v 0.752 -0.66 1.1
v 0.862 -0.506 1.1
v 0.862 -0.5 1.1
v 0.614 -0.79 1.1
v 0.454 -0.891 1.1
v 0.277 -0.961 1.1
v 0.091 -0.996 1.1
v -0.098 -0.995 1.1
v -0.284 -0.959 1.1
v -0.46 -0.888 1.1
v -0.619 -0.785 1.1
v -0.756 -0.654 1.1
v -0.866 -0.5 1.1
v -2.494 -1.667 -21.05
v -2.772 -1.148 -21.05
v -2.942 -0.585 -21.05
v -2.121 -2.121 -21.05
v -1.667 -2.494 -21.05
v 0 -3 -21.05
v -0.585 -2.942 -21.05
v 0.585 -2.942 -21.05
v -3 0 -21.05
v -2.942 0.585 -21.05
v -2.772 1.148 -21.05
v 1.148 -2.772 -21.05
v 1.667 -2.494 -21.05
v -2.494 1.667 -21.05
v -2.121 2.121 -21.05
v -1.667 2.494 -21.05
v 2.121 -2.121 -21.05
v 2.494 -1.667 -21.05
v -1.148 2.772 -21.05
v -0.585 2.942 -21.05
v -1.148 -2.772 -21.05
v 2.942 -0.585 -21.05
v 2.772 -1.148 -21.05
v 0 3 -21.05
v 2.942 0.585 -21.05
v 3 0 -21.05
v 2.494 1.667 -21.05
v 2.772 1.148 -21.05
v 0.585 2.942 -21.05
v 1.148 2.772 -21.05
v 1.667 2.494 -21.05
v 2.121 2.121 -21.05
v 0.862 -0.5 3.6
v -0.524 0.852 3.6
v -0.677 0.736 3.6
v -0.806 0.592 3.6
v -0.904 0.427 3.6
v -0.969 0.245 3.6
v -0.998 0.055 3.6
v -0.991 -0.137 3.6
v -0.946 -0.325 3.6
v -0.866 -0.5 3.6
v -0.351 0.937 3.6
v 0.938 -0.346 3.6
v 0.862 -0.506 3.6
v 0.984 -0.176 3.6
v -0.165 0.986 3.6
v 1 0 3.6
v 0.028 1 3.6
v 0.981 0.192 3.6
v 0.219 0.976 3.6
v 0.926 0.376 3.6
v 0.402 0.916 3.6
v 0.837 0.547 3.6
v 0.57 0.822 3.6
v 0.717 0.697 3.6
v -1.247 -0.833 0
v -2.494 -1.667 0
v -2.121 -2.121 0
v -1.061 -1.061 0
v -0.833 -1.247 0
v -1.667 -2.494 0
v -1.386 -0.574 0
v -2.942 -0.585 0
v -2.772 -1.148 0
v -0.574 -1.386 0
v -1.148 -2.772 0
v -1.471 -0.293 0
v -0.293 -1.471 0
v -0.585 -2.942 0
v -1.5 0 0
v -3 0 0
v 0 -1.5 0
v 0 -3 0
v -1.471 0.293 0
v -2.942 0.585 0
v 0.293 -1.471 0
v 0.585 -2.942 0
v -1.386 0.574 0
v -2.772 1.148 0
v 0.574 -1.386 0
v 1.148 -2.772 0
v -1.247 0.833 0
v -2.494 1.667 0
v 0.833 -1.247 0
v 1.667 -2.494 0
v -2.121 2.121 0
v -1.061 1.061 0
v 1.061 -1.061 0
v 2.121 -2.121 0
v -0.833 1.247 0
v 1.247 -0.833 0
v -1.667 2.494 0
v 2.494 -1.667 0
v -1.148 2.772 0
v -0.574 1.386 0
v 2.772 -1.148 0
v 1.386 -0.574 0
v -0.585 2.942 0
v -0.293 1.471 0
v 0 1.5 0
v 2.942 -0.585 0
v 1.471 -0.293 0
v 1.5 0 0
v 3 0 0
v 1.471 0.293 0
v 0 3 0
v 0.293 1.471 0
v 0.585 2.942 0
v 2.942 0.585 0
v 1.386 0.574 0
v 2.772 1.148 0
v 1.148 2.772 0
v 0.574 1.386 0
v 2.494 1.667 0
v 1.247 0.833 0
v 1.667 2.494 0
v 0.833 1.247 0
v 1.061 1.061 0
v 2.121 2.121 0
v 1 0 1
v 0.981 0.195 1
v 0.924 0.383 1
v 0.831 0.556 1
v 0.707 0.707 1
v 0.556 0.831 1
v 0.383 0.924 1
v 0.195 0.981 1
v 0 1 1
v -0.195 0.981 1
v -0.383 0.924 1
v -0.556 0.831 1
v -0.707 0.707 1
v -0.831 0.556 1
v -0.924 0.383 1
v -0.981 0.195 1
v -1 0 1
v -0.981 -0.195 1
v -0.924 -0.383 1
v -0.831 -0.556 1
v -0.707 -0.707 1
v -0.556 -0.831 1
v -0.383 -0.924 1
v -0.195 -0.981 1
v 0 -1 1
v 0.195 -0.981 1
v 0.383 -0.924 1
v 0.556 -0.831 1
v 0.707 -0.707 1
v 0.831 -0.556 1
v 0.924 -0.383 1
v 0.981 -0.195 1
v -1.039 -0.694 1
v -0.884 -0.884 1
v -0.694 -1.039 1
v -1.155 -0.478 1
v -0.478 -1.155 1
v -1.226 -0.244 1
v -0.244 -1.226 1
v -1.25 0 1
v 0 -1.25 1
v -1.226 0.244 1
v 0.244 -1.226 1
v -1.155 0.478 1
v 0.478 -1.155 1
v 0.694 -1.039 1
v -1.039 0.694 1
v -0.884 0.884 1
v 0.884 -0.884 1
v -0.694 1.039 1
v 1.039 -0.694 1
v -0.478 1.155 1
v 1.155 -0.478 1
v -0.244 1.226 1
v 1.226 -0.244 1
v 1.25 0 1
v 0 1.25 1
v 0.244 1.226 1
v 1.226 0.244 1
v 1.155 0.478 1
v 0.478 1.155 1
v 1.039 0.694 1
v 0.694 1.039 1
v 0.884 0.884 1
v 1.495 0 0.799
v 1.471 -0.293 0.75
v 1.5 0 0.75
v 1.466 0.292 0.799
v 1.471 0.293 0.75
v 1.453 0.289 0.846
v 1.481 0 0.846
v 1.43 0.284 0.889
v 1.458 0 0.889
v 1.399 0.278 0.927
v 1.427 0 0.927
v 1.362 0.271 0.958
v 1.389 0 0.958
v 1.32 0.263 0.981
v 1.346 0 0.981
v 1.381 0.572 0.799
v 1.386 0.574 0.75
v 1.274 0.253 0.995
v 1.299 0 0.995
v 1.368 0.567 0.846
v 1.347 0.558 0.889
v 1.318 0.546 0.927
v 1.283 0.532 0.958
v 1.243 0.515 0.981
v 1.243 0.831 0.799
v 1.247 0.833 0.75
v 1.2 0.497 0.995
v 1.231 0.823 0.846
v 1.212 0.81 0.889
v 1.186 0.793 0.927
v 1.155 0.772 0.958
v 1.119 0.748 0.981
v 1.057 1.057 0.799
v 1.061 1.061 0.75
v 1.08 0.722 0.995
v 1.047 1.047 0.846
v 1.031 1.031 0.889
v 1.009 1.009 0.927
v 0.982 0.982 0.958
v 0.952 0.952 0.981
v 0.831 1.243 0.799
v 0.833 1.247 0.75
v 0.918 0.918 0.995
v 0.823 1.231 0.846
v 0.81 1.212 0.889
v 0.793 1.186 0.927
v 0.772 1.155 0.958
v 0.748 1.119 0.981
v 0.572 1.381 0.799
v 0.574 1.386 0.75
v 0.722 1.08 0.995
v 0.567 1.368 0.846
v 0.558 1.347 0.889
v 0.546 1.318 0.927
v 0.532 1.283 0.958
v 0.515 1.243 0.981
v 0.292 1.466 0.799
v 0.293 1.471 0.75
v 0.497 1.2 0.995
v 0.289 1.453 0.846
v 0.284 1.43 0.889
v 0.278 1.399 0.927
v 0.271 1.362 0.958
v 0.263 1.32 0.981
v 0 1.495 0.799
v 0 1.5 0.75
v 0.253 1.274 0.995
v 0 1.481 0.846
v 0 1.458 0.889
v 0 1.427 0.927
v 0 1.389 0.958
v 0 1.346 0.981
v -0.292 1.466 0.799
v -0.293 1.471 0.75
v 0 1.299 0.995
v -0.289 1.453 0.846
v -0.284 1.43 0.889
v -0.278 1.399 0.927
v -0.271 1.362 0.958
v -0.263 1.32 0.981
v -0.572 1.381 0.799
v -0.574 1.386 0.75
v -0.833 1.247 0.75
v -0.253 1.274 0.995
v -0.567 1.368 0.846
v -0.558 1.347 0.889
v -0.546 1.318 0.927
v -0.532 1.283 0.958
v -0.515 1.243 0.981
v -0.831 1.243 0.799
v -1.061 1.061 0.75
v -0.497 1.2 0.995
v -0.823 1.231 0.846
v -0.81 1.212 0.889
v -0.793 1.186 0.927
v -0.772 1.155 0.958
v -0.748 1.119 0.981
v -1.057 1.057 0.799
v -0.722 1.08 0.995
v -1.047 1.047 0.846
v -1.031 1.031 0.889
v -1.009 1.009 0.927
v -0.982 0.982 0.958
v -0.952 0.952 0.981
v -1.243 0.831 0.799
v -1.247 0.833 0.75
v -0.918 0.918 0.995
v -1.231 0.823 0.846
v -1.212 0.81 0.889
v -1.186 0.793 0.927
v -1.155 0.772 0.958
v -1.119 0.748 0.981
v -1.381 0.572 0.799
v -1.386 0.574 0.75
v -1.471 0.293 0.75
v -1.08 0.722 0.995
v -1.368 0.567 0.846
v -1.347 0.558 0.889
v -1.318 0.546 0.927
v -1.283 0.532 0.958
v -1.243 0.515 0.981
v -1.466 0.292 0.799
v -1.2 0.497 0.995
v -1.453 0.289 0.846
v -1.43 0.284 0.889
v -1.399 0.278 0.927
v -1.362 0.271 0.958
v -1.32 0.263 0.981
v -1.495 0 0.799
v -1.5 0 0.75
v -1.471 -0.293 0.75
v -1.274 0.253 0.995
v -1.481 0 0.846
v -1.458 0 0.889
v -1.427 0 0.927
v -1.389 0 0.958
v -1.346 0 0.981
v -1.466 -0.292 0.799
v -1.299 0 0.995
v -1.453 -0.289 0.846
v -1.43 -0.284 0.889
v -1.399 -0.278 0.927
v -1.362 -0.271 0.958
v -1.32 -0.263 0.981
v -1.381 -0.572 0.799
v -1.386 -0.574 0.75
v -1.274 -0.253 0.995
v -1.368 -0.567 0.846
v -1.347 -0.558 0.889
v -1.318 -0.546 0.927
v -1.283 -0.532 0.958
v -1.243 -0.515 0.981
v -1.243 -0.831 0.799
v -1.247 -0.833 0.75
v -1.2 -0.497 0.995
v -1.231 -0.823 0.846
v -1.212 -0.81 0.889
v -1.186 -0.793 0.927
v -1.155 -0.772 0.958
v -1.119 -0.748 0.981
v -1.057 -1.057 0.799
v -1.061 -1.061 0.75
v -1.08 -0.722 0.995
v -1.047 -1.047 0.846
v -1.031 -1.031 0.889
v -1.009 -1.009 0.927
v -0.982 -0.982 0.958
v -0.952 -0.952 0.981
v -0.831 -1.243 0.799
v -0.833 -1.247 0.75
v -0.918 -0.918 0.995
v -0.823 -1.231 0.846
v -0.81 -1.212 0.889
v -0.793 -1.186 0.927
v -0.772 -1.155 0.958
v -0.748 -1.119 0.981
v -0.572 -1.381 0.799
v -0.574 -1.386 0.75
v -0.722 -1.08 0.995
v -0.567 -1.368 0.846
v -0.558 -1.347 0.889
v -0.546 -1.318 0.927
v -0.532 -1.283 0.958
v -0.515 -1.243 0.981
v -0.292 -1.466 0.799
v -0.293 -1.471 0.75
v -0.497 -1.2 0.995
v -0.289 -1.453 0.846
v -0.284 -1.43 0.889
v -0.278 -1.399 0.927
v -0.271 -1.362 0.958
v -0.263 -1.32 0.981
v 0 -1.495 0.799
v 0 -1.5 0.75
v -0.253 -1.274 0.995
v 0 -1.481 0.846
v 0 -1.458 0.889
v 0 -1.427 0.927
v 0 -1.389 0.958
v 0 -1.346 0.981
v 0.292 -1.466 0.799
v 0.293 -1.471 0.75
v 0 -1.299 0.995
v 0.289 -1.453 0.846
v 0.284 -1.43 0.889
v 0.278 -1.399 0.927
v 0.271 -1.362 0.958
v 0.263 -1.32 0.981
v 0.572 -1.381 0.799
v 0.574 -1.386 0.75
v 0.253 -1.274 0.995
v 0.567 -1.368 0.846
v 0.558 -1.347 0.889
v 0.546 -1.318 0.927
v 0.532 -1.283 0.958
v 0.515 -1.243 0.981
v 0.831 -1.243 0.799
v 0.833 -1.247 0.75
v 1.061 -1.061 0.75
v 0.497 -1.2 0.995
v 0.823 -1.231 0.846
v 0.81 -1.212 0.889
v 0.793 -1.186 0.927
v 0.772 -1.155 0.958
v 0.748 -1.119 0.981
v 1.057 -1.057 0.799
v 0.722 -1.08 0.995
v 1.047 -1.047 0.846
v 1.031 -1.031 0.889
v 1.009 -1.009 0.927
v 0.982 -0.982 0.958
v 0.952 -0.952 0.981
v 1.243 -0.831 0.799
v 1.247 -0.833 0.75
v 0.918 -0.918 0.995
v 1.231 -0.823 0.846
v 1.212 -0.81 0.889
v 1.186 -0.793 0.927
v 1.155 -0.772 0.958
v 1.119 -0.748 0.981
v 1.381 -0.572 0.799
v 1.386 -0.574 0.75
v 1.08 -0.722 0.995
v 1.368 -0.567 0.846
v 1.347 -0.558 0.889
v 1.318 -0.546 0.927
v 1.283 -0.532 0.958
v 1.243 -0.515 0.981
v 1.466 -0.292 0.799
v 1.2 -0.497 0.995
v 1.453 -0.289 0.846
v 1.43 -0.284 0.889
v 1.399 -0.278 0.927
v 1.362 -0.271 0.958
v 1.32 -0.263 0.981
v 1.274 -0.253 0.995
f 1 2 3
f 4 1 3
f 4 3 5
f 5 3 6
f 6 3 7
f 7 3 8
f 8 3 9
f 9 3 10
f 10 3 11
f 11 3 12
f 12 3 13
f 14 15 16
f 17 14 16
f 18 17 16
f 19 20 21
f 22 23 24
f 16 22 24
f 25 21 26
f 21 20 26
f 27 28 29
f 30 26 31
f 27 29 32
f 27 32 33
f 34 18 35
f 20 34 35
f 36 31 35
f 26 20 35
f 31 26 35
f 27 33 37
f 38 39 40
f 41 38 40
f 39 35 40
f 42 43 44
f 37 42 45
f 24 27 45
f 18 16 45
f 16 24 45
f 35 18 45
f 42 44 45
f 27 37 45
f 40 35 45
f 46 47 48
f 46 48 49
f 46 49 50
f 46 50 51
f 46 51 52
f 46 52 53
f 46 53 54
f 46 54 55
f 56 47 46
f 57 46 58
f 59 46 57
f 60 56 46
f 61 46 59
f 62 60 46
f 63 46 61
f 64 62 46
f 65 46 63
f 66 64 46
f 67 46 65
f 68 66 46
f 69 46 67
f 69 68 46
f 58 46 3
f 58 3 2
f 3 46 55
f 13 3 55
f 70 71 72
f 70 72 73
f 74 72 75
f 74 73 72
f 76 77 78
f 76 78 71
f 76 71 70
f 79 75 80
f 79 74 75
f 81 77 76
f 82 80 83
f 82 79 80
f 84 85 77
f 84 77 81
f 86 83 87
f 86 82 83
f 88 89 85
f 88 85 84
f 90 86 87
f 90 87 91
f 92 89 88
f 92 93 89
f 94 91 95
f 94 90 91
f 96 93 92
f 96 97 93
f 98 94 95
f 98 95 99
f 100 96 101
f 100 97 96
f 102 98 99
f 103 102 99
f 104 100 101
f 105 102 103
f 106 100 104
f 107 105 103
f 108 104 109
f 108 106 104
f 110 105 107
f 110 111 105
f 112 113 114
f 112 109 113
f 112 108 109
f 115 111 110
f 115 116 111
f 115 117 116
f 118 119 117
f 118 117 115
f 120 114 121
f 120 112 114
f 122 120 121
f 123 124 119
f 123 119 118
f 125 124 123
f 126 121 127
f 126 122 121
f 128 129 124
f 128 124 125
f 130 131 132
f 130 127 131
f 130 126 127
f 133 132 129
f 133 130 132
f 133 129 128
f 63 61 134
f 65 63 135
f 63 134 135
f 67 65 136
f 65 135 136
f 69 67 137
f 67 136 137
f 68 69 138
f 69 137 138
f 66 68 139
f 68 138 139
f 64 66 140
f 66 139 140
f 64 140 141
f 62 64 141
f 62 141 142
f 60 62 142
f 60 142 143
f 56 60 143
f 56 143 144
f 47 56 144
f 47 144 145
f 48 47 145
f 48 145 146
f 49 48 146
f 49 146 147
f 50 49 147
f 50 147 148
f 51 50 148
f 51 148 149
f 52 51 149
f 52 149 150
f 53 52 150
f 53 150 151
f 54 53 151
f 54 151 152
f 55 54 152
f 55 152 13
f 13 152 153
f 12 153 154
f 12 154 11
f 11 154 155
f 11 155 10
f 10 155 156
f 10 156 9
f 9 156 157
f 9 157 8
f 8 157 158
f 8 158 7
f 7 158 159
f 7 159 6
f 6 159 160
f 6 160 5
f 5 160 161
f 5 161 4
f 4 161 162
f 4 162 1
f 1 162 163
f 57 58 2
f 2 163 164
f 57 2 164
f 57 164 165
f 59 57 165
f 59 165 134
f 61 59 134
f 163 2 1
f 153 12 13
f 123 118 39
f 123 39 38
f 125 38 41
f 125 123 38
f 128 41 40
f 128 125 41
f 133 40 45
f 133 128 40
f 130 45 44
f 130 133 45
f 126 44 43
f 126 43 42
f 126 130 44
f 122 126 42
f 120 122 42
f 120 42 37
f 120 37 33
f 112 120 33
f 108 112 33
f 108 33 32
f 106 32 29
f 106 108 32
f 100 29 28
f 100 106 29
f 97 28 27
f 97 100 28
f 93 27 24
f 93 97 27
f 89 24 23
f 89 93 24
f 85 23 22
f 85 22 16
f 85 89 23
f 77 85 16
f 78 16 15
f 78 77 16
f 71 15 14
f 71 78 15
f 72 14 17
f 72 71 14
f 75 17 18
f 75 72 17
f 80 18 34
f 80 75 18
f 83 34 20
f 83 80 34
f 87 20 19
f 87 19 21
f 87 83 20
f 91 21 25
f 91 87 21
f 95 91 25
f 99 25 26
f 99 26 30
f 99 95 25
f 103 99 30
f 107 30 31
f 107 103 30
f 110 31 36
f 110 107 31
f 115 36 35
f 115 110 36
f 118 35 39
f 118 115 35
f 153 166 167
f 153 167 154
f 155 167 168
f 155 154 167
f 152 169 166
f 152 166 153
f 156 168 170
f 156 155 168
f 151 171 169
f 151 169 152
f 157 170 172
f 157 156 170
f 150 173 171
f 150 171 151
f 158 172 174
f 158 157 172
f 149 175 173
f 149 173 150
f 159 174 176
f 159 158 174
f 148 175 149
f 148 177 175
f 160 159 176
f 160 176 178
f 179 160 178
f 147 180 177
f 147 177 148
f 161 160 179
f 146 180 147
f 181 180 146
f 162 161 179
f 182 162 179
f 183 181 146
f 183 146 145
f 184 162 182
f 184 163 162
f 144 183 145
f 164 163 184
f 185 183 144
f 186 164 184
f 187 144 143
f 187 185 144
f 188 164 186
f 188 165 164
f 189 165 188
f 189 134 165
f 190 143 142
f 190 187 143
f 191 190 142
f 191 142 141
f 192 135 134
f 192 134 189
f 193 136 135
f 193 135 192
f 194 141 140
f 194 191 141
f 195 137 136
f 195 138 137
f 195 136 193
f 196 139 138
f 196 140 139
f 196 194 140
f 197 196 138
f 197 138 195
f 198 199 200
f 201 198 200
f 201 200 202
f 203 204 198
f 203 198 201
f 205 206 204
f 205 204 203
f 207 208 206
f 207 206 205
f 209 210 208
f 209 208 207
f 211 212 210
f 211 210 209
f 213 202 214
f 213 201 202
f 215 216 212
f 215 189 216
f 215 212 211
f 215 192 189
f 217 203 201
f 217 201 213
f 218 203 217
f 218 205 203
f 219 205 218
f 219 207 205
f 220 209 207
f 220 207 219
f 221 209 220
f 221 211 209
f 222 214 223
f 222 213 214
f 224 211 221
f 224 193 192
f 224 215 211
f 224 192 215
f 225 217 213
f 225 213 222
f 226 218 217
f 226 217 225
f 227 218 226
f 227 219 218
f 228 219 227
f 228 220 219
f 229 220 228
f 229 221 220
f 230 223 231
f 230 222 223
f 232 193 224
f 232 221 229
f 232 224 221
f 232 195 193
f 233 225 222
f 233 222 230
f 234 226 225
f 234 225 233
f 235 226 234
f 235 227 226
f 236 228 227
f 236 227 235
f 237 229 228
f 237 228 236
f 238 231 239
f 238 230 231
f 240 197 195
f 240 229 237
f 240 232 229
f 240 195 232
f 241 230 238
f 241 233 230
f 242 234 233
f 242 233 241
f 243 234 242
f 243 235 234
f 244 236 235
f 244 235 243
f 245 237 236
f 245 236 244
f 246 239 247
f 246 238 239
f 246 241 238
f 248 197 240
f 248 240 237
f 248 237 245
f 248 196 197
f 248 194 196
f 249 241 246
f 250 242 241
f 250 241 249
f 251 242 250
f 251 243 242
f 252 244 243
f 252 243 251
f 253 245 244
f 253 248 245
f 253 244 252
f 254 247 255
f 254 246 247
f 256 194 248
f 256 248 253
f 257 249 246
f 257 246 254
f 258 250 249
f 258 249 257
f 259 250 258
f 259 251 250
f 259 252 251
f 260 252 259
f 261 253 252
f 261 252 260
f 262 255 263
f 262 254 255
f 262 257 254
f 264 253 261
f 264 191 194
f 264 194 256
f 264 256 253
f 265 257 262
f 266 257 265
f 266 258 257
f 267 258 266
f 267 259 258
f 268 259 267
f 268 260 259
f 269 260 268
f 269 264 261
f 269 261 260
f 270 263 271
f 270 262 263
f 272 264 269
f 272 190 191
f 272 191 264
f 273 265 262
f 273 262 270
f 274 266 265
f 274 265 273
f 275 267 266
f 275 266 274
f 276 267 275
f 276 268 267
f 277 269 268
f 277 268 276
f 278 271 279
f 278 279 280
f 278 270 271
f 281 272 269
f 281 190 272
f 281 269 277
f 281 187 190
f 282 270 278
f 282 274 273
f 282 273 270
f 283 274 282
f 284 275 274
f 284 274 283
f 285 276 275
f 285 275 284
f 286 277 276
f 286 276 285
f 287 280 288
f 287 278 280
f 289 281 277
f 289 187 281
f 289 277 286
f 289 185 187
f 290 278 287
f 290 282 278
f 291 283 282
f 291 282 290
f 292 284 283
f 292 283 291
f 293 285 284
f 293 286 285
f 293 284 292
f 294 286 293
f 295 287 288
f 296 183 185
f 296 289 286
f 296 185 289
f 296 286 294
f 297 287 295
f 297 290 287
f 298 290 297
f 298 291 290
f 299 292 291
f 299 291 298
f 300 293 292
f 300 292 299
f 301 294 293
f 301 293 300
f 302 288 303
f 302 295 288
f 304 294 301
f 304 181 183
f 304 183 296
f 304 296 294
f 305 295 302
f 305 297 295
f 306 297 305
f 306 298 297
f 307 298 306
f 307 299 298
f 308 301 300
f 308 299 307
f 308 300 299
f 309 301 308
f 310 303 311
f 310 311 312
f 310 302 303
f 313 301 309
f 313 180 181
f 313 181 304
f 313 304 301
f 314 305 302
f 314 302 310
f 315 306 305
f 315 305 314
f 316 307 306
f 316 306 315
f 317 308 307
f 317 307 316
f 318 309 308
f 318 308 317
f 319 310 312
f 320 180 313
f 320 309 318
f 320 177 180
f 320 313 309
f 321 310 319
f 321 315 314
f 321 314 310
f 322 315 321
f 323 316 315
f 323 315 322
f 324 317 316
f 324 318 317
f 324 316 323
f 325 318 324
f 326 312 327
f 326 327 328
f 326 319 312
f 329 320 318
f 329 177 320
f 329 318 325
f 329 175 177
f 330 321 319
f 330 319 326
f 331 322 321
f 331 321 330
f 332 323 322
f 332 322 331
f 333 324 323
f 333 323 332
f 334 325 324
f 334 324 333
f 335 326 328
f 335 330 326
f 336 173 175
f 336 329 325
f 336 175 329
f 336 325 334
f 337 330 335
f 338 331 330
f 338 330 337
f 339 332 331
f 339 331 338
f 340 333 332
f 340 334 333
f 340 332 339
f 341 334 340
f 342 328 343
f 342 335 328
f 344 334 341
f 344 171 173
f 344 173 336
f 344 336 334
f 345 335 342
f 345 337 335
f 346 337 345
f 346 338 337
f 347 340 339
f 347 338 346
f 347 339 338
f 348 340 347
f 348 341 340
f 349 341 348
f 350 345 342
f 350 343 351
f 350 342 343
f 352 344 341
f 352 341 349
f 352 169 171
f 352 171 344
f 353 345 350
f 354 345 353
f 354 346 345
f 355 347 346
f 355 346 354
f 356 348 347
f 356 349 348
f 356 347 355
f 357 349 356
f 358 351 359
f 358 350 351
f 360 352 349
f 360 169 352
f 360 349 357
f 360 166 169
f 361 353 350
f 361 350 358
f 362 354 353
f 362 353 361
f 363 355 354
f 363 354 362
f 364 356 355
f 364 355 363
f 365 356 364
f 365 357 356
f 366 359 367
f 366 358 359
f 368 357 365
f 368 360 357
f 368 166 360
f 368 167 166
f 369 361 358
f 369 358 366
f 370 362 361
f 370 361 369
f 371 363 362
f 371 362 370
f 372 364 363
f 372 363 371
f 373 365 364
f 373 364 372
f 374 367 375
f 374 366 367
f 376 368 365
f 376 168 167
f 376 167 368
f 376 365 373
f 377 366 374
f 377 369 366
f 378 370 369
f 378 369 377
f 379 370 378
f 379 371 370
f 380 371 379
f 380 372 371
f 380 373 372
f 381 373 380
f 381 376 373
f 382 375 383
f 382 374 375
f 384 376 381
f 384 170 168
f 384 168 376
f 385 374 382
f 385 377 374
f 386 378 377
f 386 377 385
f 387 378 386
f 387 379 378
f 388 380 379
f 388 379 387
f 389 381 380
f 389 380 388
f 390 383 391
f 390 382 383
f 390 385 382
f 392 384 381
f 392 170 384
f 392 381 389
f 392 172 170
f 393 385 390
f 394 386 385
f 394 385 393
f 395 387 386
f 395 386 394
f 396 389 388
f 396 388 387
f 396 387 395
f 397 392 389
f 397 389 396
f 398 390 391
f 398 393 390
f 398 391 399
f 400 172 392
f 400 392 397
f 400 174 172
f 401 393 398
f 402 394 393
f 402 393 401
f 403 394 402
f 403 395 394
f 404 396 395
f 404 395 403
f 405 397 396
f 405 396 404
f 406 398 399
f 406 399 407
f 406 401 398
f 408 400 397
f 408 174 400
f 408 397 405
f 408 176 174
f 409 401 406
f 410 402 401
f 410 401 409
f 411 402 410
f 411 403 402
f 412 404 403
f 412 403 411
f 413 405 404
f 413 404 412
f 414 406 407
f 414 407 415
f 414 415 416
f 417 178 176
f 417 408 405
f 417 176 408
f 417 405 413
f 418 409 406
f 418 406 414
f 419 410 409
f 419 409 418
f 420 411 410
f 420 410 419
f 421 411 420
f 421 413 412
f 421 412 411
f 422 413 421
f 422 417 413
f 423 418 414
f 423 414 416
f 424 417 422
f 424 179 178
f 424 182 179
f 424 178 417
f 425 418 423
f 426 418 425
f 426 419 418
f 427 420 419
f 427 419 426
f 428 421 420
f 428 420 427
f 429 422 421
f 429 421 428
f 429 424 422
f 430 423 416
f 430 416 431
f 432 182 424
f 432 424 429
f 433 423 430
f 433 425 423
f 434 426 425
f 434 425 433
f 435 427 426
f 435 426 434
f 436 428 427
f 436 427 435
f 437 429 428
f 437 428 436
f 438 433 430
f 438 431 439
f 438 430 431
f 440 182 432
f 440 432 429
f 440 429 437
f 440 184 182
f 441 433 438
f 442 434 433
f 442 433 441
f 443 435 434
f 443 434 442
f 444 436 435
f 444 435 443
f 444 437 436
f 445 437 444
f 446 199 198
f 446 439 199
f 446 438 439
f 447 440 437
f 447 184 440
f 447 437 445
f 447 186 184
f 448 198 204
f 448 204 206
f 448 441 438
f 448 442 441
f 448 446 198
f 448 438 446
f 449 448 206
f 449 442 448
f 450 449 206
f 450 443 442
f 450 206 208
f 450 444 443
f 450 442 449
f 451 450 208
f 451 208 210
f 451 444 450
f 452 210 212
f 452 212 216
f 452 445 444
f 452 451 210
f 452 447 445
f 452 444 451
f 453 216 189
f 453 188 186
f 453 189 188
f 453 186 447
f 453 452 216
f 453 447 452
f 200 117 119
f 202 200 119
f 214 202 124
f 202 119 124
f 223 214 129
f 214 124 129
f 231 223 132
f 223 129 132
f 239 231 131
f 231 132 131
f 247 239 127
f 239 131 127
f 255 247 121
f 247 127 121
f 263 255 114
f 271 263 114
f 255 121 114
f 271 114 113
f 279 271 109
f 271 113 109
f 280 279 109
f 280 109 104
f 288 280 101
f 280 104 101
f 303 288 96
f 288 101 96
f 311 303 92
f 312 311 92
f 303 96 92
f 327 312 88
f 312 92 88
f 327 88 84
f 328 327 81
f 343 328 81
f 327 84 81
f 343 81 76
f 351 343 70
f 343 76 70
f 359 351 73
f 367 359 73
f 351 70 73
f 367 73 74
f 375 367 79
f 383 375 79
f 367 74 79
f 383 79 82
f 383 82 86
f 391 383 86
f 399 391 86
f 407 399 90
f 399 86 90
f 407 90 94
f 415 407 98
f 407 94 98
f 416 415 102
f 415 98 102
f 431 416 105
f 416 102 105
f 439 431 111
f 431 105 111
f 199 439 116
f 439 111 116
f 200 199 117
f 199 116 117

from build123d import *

# Parameters (mm, degrees)
SKETCH_1_R          = 3
EXTRUDE_1_DEPTH     = 21.05
SKETCH_2_R          = 1.5
EXTRUDE_2_DEPTH     = 1
SKETCH_3_R          = 1
EXTRUDE_3_DEPTH     = 2.6
CUT_EXTRUDE_1_DEPTH = 2.5
FILLET_1_R          = 0.25


with BuildPart() as part:
    # 草图1 → 凸台-拉伸1 (new body)
    with BuildSketch(Plane.XY):
        Circle(SKETCH_1_R)
    extrude(amount=-EXTRUDE_1_DEPTH)

    # 草图2 → 凸台-拉伸2 (add)
    with BuildSketch(Plane.XY):
        Circle(SKETCH_2_R)
    extrude(amount=EXTRUDE_2_DEPTH)

    # 草图3 → 凸台-拉伸3 (add)
    with BuildSketch(Plane.XY.offset(1)):
        Circle(SKETCH_3_R)
    extrude(amount=EXTRUDE_3_DEPTH)

    # 草图4 → 切除-拉伸1 (cut)
    with BuildSketch(Plane.XY.offset(3.6)):
        Polygon((0, -0.5), (0.862464595, -0.5), (0.862464595, -1), (0, -1), (-0.86936686, -1), (-0.86936686, -0.5), align=None)
    extrude(amount=-CUT_EXTRUDE_1_DEPTH, mode=Mode.SUBTRACT)

    # 圆角1
    fillet_1_edges = [part.edges().sort_by_distance(p)[0] for p in [
        (-1.5, 0, 1),
    ]]
    fillet(fillet_1_edges, radius=FILLET_1_R)


solid = part.part
